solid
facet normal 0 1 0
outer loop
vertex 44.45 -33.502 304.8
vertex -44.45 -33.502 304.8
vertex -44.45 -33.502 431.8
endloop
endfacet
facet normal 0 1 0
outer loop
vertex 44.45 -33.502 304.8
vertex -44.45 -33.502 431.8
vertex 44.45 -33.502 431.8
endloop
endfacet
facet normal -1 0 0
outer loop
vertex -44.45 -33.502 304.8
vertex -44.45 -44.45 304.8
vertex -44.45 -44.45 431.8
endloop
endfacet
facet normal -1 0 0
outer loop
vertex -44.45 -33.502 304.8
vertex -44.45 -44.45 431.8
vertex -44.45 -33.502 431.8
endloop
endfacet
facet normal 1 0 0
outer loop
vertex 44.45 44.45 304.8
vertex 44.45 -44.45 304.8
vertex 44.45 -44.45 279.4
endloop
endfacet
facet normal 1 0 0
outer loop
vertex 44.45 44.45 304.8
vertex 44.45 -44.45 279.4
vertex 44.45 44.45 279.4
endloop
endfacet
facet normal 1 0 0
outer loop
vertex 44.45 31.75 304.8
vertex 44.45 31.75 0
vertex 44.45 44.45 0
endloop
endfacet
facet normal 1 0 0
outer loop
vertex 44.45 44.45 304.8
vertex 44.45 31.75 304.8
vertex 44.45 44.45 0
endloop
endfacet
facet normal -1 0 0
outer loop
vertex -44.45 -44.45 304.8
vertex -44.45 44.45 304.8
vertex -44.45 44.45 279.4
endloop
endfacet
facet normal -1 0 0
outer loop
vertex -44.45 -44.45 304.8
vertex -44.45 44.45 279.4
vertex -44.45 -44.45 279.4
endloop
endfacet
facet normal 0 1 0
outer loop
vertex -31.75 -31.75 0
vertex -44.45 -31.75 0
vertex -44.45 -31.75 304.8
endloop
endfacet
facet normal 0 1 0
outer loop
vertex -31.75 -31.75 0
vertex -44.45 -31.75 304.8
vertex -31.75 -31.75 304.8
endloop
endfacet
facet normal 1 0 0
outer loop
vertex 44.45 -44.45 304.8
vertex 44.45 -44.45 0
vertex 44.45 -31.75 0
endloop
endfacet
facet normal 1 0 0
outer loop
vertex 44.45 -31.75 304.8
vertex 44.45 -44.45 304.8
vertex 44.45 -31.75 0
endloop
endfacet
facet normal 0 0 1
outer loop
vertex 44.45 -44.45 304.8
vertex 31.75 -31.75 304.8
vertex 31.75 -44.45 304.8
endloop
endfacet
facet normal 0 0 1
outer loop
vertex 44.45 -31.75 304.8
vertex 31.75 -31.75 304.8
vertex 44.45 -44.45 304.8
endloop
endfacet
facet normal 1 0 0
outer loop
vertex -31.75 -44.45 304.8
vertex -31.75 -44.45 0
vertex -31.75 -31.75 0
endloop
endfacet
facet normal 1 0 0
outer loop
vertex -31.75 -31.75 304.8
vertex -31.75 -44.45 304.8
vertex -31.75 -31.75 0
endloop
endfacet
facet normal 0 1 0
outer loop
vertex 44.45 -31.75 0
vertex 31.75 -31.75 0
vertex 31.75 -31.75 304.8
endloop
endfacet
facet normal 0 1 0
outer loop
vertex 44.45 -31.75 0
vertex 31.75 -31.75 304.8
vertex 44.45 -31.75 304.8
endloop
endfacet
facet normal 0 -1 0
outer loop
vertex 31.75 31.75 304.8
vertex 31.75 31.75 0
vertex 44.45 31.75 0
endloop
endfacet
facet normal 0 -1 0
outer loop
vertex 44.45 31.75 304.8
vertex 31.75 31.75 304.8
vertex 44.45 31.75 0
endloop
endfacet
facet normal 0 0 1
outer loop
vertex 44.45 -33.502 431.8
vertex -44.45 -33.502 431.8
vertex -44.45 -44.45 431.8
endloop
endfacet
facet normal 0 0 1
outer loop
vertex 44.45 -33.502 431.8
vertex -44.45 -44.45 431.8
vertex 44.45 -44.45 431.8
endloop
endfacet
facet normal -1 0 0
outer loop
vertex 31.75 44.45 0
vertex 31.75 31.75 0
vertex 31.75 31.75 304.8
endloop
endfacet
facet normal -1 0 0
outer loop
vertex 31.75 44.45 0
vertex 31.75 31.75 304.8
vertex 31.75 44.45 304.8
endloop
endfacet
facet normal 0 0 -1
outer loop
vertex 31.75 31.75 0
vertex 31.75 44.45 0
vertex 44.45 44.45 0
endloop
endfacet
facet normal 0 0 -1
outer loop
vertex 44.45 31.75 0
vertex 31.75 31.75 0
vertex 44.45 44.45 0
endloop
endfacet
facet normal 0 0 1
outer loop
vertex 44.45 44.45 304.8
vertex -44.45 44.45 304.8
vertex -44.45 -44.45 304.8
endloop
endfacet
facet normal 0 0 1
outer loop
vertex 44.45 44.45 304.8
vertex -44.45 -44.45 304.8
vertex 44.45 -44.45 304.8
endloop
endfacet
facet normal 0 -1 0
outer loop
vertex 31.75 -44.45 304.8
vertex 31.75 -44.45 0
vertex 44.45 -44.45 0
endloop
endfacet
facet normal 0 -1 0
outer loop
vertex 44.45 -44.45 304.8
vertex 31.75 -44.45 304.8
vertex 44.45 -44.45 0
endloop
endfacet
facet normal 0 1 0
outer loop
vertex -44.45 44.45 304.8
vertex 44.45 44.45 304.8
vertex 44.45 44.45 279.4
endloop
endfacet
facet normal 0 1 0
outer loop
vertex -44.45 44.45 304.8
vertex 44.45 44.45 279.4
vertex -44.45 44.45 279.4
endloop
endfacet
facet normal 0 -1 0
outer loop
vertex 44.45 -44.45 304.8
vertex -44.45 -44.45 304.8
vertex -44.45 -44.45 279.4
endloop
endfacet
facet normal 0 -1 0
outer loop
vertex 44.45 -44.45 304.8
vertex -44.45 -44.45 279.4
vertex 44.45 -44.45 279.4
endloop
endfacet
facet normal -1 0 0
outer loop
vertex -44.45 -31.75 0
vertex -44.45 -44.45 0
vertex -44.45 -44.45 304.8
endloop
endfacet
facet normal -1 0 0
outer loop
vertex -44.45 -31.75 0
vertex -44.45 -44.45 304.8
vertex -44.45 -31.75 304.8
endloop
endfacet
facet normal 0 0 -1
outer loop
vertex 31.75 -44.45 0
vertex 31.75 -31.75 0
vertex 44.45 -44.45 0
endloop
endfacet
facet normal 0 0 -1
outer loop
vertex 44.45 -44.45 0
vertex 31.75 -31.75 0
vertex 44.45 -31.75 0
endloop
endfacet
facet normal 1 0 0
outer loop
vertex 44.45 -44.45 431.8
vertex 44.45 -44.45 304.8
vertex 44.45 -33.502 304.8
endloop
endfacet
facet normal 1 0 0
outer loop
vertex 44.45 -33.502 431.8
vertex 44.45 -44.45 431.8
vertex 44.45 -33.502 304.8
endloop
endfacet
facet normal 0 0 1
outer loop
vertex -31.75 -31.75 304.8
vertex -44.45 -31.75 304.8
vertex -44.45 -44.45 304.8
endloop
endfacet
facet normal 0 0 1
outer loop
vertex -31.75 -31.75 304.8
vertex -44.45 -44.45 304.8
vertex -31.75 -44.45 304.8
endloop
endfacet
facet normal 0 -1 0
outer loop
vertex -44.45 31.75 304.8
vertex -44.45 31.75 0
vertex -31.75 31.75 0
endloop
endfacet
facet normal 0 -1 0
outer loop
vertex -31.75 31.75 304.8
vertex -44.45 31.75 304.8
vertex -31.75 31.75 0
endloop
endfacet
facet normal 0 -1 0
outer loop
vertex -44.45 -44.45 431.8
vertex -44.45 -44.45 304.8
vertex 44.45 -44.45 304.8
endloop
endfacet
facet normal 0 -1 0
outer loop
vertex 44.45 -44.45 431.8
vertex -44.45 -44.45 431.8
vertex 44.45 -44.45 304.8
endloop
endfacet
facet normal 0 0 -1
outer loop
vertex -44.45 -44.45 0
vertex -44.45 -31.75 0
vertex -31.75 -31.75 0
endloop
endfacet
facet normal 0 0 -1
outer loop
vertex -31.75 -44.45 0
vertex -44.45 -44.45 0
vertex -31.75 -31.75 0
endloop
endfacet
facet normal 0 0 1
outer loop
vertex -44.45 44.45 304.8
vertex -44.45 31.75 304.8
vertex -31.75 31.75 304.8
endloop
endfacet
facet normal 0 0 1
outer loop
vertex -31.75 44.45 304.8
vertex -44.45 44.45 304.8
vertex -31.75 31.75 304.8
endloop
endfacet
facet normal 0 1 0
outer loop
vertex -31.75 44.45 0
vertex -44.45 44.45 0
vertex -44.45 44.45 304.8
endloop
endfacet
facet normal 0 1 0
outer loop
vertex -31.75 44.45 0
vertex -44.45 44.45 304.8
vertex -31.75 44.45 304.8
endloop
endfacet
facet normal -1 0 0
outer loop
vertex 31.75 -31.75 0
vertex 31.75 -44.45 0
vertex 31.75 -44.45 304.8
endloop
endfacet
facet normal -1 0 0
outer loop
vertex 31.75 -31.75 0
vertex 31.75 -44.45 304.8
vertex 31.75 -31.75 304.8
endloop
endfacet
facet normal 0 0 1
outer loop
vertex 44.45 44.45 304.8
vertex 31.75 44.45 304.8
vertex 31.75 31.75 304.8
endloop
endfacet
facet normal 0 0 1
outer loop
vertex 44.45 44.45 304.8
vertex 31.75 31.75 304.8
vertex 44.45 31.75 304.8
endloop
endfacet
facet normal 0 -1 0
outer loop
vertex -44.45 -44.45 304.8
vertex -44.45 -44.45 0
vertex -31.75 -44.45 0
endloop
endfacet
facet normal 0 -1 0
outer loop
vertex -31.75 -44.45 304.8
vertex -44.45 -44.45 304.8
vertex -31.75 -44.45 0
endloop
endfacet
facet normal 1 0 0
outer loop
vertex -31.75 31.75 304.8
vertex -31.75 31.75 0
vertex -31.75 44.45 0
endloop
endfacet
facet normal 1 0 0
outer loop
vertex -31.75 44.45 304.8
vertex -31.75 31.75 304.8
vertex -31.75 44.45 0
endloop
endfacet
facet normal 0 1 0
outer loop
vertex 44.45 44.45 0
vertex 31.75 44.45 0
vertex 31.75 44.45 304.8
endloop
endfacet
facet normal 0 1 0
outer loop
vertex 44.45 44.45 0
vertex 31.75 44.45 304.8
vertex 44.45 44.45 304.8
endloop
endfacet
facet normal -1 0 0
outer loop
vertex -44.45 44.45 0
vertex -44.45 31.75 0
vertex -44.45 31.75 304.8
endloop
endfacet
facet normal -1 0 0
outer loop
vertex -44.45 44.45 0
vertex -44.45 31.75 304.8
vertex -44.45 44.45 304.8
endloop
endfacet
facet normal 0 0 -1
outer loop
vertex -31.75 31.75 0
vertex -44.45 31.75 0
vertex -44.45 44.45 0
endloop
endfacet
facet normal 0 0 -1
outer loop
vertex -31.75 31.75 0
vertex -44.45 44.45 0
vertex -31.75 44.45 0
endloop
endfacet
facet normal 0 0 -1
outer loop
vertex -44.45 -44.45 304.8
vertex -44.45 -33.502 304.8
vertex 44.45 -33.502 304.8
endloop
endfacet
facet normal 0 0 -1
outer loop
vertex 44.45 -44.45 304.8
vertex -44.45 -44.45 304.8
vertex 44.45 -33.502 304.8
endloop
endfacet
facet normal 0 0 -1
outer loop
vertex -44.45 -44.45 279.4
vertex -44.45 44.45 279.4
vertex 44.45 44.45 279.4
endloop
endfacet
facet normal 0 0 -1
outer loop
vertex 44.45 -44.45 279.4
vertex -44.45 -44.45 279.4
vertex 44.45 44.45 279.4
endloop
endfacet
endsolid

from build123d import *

# Parameters (mm, degrees)
F0_W     = 12.7
F0_H     = 12.7
F1_DEPTH = 304.8
F2_W     = 12.7
F2_H     = 12.7
F3_DEPTH = 25.4
F4_W     = 88.9
F4_H     = 10.9482222021
F5_DEPTH = 127


with BuildPart() as f1:
    # F0 (on Top) → F1 (new body)
    with BuildSketch(Plane.XY):
        with Locations((-38.1, -38.1)):
            Rectangle(F0_W, F0_H)
    extrude(amount=F1_DEPTH)


with BuildPart() as f1b:
    # F0 (on Top) → F1, piece 2 (new body)
    with BuildSketch(Plane.XY):
        with Locations((38.1, 38.1)):
            Rectangle(F0_W, F0_H)
    extrude(amount=F1_DEPTH)


with BuildPart() as f1c:
    # F0 (on Top) → F1, piece 3 (new body)
    with BuildSketch(Plane.XY):
        with Locations((38.1, -38.1)):
            Rectangle(F0_W, F0_H)
    extrude(amount=F1_DEPTH)


with BuildPart() as f1d:
    # F0 (on Top) → F1, piece 4 (new body)
    with BuildSketch(Plane.XY):
        with Locations((-38.1, 38.1)):
            Rectangle(F0_W, F0_H)
    extrude(amount=F1_DEPTH)


with BuildPart() as f3:
    # F2 (on face) → F3 (new body)
    with BuildSketch(Plane.XY.offset(304.8)):
        Polygon((44.45, 44.45), (-31.75, 44.45), (-31.75, 31.75), (-44.45, 31.75), (-44.45, -44.45), (44.45, -44.45), align=None)
        with Locations((-38.1, 38.1)):
            Rectangle(F2_W, F2_H)
    extrude(amount=-F3_DEPTH)


with BuildPart() as f5:
    # F4 (on face) → F5 (new body)
    with BuildSketch(Plane.XY.offset(304.8)):
        with Locations((0, -38.975888899)):
            Rectangle(F4_W, F4_H)
    extrude(amount=F5_DEPTH)


solid = Compound([f1.part, f1b.part, f1c.part, f1d.part, f3.part, f5.part])
